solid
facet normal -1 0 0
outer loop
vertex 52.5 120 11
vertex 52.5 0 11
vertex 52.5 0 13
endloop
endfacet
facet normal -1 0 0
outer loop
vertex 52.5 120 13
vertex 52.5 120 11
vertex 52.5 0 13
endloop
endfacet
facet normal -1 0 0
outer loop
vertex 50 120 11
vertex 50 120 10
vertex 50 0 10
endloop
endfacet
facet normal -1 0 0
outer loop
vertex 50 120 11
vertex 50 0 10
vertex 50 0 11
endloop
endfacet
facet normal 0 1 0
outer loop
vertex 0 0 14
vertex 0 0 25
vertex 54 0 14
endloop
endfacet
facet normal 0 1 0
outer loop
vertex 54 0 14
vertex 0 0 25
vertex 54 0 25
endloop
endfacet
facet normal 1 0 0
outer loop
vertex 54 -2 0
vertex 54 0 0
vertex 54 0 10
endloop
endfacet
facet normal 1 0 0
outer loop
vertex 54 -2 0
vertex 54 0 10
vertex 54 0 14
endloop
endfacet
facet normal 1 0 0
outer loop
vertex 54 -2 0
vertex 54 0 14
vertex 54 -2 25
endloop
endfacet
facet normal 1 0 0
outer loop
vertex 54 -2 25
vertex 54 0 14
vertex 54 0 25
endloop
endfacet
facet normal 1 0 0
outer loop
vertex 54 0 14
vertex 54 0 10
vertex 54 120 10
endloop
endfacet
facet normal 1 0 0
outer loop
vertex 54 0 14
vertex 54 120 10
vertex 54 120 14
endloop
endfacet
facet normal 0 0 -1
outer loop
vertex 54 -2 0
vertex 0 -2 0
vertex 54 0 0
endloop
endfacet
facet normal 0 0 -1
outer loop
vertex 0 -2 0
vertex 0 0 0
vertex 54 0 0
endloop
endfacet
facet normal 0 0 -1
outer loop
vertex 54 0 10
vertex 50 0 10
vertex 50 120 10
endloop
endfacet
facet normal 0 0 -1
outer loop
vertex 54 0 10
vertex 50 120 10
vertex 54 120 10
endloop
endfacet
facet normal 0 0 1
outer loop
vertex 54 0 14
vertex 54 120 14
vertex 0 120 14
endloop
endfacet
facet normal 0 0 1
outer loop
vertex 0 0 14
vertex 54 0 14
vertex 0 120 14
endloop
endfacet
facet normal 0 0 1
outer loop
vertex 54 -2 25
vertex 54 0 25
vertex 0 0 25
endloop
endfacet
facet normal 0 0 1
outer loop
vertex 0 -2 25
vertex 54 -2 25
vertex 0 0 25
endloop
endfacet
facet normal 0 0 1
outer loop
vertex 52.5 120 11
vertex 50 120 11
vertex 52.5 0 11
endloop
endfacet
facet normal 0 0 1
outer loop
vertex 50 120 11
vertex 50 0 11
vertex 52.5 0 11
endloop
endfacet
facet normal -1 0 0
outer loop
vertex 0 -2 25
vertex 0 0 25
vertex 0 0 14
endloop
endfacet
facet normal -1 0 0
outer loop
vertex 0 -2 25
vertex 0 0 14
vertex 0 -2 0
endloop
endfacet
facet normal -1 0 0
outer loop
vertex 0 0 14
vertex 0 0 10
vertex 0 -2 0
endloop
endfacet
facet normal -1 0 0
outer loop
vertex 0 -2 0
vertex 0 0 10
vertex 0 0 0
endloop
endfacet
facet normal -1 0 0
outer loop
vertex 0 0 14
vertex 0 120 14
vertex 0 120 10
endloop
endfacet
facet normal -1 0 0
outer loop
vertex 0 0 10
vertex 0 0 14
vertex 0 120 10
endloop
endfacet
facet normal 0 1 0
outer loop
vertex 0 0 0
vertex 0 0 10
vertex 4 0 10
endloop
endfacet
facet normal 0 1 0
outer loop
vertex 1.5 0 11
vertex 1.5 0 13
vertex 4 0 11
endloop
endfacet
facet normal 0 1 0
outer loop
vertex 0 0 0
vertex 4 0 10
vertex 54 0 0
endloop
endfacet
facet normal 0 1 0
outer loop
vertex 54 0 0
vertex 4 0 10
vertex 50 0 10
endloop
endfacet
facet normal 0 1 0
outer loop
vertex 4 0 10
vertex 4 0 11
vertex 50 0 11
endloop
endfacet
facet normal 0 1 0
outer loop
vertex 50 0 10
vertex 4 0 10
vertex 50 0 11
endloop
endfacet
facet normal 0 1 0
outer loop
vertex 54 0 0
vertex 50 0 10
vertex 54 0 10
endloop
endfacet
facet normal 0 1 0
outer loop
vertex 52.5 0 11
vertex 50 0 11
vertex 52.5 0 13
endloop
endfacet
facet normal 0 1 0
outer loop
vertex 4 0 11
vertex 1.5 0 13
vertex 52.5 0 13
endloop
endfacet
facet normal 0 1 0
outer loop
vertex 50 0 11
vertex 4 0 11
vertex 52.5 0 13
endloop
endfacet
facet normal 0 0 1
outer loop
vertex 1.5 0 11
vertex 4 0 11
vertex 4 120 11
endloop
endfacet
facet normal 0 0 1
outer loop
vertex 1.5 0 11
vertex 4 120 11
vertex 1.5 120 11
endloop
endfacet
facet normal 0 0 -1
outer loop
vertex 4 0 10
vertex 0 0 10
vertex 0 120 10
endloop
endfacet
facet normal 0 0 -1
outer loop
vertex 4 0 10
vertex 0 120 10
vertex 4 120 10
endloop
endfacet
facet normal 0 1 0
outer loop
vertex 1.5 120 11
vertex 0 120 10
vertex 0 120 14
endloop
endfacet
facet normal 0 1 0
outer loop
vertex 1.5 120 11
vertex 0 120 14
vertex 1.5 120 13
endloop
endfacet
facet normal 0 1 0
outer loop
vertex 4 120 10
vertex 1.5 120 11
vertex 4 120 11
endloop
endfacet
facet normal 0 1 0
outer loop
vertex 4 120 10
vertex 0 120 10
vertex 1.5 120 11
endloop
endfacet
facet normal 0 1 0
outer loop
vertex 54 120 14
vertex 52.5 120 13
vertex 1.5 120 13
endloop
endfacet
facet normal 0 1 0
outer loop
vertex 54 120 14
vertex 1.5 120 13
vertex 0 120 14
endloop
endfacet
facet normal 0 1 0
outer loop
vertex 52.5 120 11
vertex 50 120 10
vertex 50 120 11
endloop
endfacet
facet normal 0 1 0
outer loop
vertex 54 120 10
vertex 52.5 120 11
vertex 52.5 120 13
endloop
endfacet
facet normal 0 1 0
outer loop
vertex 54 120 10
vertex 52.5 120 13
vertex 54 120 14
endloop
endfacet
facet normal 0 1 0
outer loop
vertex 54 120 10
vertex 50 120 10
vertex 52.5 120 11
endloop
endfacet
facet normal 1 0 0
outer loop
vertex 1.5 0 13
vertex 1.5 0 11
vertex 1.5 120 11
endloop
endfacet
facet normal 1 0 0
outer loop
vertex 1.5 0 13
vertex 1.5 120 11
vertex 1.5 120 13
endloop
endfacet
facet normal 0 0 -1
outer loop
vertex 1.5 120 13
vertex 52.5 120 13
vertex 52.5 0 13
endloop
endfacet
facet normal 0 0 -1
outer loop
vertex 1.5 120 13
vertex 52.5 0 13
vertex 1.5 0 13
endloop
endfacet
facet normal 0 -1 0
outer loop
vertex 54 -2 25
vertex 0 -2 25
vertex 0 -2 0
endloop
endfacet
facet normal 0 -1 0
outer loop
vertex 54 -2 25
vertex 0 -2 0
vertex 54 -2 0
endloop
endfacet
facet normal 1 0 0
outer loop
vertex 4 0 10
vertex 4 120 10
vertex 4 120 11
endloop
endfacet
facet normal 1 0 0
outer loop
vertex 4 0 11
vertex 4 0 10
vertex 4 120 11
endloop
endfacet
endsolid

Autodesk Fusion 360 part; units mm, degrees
sketch "Sketch1" plane through (0, 0, 0) normal (0, 1, 0) x (1, 0, 0)
  line L0 (0, -10) -> (54, -10)
  line L1 (54, -10) -> (54, -14)
  line L2 (54, -14) -> (0, -14)
  line L3 (0, -14) -> (0, -10)
  line L4 (0, -10) -> (1.5, -10)
  line L5 (1.5, -11) -> (1.5, -12.5)
  line L6 (1.5, -14) -> (0, -14)
  line L7 (0, -14) -> (0, -10)
  line L8 (54, -10) -> (52.5, -10)
  line L9 (52.5, -11) -> (52.5, -12.5)
  line L10 (52.5, -14) -> (54, -14)
  line L11 (54, -14) -> (54, -10)
  line L12 (1.5, -14) -> (52.5, -14)
  line L13 (52.5, -12.5) -> (1.5, -12.5)
  line L14 (1.5, -10) -> (4, -10)
  line L15 (4, -10) -> (4, -11)
  line L16 (4, -11) -> (1.5, -11)
  line L17 (52.5, -10) -> (50, -10)
  line L18 (50, -10) -> (50, -11)
  line L19 (50, -11) -> (52.5, -11)
  dimension "d1" = 54
  dimension "d2" = 4
  dimension "d3" = 1.5
  dimension "d4" = 1.5
  dimension "d5" = 51
  dimension "d6" = 1.5
extrude "Extrude1" add sketch "Sketch1" along normal blind 120 contours L0 L1 L2 L3 L4 L5 L6 L7 L8 L9 L10 L11 L12 L13 L14 L15 L16 L17 L18 L19
sketch "Sketch2" plane through (0, 0, 0) normal (0, -1, 0) x (1, 0, 0)
  line L0 (54, 14) -> (0, 14)
  line L1 (0, 14) -> (0, 10)
  line L2 (0, 10) -> (4, 10)
  line L3 (4, 10) -> (4, 11)
  line L4 (4, 11) -> (1.5, 11)
  line L5 (1.5, 11) -> (1.5, 12.5)
  line L6 (1.5, 12.5) -> (52.5, 12.5)
  line L7 (52.5, 12.5) -> (52.5, 11)
  line L8 (52.5, 11) -> (50, 11)
  line L9 (50, 11) -> (50, 10)
  line L10 (50, 10) -> (54, 10)
  line L11 (54, 10) -> (54, 14)
  line L12 (0, 0) -> (54, 0)
  line L13 (54, 0) -> (54, 25)
  line L14 (54, 25) -> (0, 25)
  line L15 (0, 25) -> (0, 0)
extrude "Extrude2" add sketch "Sketch2" along normal blind 2
sketch "Sketch3" plane through (0, 120, 0) normal (0, 1, 0) x (-1, 0, 0)
  line L0 (0, 14) -> (-54, 14)
  line L1 (-54, 14) -> (-54, 10)
  line L2 (-54, 10) -> (-50, 10)
  line L3 (-50, 10) -> (-50, 11)
  line L4 (-50, 11) -> (-52.5, 11)
  line L5 (-52.5, 11) -> (-52.5, 12.5)
  line L6 (-52.5, 12.5) -> (-1.5, 12.5)
  line L7 (-1.5, 12.5) -> (-1.5, 11)
  line L8 (-1.5, 11) -> (-4, 11)
  line L9 (-4, 11) -> (-4, 10)
  line L10 (-4, 10) -> (0, 10)
  line L11 (0, 10) -> (0, 14)
  line L12 (-1.5, 12.5) -> (-52.5, 12.5)
  line L13 (-52.5, 12.5) -> (-52.5, 13)
  line L14 (-52.5, 13) -> (-1.5, 13)
  line L15 (-1.5, 13) -> (-1.5, 12.5)
  dimension "d11" = 0.5
extrude "Extrude3" cut sketch "Sketch3" against normal blind 120 contours L6 L12 L13 L14 L15
sketch "Sketch4" plane through (0, 120, 0) normal (0, 1, 0) x (-1, 0, 0)
  line L0 (-1.5, 13) -> (-1.5, 11)
  line L1 (-1.5, 11) -> (-4, 11)
  line L2 (-4, 11) -> (-4, 10)
  line L3 (-4, 10) -> (0, 10)
  line L4 (0, 10) -> (0, 14)
  line L5 (0, 14) -> (-54, 14)
  line L6 (-54, 14) -> (-54, 10)
  line L7 (-54, 10) -> (-50, 10)
  line L8 (-50, 10) -> (-50, 11)
  line L9 (-50, 11) -> (-52.5, 11)
  line L10 (-52.5, 11) -> (-52.5, 13)
  line L11 (-52.5, 13) -> (-1.5, 13)
